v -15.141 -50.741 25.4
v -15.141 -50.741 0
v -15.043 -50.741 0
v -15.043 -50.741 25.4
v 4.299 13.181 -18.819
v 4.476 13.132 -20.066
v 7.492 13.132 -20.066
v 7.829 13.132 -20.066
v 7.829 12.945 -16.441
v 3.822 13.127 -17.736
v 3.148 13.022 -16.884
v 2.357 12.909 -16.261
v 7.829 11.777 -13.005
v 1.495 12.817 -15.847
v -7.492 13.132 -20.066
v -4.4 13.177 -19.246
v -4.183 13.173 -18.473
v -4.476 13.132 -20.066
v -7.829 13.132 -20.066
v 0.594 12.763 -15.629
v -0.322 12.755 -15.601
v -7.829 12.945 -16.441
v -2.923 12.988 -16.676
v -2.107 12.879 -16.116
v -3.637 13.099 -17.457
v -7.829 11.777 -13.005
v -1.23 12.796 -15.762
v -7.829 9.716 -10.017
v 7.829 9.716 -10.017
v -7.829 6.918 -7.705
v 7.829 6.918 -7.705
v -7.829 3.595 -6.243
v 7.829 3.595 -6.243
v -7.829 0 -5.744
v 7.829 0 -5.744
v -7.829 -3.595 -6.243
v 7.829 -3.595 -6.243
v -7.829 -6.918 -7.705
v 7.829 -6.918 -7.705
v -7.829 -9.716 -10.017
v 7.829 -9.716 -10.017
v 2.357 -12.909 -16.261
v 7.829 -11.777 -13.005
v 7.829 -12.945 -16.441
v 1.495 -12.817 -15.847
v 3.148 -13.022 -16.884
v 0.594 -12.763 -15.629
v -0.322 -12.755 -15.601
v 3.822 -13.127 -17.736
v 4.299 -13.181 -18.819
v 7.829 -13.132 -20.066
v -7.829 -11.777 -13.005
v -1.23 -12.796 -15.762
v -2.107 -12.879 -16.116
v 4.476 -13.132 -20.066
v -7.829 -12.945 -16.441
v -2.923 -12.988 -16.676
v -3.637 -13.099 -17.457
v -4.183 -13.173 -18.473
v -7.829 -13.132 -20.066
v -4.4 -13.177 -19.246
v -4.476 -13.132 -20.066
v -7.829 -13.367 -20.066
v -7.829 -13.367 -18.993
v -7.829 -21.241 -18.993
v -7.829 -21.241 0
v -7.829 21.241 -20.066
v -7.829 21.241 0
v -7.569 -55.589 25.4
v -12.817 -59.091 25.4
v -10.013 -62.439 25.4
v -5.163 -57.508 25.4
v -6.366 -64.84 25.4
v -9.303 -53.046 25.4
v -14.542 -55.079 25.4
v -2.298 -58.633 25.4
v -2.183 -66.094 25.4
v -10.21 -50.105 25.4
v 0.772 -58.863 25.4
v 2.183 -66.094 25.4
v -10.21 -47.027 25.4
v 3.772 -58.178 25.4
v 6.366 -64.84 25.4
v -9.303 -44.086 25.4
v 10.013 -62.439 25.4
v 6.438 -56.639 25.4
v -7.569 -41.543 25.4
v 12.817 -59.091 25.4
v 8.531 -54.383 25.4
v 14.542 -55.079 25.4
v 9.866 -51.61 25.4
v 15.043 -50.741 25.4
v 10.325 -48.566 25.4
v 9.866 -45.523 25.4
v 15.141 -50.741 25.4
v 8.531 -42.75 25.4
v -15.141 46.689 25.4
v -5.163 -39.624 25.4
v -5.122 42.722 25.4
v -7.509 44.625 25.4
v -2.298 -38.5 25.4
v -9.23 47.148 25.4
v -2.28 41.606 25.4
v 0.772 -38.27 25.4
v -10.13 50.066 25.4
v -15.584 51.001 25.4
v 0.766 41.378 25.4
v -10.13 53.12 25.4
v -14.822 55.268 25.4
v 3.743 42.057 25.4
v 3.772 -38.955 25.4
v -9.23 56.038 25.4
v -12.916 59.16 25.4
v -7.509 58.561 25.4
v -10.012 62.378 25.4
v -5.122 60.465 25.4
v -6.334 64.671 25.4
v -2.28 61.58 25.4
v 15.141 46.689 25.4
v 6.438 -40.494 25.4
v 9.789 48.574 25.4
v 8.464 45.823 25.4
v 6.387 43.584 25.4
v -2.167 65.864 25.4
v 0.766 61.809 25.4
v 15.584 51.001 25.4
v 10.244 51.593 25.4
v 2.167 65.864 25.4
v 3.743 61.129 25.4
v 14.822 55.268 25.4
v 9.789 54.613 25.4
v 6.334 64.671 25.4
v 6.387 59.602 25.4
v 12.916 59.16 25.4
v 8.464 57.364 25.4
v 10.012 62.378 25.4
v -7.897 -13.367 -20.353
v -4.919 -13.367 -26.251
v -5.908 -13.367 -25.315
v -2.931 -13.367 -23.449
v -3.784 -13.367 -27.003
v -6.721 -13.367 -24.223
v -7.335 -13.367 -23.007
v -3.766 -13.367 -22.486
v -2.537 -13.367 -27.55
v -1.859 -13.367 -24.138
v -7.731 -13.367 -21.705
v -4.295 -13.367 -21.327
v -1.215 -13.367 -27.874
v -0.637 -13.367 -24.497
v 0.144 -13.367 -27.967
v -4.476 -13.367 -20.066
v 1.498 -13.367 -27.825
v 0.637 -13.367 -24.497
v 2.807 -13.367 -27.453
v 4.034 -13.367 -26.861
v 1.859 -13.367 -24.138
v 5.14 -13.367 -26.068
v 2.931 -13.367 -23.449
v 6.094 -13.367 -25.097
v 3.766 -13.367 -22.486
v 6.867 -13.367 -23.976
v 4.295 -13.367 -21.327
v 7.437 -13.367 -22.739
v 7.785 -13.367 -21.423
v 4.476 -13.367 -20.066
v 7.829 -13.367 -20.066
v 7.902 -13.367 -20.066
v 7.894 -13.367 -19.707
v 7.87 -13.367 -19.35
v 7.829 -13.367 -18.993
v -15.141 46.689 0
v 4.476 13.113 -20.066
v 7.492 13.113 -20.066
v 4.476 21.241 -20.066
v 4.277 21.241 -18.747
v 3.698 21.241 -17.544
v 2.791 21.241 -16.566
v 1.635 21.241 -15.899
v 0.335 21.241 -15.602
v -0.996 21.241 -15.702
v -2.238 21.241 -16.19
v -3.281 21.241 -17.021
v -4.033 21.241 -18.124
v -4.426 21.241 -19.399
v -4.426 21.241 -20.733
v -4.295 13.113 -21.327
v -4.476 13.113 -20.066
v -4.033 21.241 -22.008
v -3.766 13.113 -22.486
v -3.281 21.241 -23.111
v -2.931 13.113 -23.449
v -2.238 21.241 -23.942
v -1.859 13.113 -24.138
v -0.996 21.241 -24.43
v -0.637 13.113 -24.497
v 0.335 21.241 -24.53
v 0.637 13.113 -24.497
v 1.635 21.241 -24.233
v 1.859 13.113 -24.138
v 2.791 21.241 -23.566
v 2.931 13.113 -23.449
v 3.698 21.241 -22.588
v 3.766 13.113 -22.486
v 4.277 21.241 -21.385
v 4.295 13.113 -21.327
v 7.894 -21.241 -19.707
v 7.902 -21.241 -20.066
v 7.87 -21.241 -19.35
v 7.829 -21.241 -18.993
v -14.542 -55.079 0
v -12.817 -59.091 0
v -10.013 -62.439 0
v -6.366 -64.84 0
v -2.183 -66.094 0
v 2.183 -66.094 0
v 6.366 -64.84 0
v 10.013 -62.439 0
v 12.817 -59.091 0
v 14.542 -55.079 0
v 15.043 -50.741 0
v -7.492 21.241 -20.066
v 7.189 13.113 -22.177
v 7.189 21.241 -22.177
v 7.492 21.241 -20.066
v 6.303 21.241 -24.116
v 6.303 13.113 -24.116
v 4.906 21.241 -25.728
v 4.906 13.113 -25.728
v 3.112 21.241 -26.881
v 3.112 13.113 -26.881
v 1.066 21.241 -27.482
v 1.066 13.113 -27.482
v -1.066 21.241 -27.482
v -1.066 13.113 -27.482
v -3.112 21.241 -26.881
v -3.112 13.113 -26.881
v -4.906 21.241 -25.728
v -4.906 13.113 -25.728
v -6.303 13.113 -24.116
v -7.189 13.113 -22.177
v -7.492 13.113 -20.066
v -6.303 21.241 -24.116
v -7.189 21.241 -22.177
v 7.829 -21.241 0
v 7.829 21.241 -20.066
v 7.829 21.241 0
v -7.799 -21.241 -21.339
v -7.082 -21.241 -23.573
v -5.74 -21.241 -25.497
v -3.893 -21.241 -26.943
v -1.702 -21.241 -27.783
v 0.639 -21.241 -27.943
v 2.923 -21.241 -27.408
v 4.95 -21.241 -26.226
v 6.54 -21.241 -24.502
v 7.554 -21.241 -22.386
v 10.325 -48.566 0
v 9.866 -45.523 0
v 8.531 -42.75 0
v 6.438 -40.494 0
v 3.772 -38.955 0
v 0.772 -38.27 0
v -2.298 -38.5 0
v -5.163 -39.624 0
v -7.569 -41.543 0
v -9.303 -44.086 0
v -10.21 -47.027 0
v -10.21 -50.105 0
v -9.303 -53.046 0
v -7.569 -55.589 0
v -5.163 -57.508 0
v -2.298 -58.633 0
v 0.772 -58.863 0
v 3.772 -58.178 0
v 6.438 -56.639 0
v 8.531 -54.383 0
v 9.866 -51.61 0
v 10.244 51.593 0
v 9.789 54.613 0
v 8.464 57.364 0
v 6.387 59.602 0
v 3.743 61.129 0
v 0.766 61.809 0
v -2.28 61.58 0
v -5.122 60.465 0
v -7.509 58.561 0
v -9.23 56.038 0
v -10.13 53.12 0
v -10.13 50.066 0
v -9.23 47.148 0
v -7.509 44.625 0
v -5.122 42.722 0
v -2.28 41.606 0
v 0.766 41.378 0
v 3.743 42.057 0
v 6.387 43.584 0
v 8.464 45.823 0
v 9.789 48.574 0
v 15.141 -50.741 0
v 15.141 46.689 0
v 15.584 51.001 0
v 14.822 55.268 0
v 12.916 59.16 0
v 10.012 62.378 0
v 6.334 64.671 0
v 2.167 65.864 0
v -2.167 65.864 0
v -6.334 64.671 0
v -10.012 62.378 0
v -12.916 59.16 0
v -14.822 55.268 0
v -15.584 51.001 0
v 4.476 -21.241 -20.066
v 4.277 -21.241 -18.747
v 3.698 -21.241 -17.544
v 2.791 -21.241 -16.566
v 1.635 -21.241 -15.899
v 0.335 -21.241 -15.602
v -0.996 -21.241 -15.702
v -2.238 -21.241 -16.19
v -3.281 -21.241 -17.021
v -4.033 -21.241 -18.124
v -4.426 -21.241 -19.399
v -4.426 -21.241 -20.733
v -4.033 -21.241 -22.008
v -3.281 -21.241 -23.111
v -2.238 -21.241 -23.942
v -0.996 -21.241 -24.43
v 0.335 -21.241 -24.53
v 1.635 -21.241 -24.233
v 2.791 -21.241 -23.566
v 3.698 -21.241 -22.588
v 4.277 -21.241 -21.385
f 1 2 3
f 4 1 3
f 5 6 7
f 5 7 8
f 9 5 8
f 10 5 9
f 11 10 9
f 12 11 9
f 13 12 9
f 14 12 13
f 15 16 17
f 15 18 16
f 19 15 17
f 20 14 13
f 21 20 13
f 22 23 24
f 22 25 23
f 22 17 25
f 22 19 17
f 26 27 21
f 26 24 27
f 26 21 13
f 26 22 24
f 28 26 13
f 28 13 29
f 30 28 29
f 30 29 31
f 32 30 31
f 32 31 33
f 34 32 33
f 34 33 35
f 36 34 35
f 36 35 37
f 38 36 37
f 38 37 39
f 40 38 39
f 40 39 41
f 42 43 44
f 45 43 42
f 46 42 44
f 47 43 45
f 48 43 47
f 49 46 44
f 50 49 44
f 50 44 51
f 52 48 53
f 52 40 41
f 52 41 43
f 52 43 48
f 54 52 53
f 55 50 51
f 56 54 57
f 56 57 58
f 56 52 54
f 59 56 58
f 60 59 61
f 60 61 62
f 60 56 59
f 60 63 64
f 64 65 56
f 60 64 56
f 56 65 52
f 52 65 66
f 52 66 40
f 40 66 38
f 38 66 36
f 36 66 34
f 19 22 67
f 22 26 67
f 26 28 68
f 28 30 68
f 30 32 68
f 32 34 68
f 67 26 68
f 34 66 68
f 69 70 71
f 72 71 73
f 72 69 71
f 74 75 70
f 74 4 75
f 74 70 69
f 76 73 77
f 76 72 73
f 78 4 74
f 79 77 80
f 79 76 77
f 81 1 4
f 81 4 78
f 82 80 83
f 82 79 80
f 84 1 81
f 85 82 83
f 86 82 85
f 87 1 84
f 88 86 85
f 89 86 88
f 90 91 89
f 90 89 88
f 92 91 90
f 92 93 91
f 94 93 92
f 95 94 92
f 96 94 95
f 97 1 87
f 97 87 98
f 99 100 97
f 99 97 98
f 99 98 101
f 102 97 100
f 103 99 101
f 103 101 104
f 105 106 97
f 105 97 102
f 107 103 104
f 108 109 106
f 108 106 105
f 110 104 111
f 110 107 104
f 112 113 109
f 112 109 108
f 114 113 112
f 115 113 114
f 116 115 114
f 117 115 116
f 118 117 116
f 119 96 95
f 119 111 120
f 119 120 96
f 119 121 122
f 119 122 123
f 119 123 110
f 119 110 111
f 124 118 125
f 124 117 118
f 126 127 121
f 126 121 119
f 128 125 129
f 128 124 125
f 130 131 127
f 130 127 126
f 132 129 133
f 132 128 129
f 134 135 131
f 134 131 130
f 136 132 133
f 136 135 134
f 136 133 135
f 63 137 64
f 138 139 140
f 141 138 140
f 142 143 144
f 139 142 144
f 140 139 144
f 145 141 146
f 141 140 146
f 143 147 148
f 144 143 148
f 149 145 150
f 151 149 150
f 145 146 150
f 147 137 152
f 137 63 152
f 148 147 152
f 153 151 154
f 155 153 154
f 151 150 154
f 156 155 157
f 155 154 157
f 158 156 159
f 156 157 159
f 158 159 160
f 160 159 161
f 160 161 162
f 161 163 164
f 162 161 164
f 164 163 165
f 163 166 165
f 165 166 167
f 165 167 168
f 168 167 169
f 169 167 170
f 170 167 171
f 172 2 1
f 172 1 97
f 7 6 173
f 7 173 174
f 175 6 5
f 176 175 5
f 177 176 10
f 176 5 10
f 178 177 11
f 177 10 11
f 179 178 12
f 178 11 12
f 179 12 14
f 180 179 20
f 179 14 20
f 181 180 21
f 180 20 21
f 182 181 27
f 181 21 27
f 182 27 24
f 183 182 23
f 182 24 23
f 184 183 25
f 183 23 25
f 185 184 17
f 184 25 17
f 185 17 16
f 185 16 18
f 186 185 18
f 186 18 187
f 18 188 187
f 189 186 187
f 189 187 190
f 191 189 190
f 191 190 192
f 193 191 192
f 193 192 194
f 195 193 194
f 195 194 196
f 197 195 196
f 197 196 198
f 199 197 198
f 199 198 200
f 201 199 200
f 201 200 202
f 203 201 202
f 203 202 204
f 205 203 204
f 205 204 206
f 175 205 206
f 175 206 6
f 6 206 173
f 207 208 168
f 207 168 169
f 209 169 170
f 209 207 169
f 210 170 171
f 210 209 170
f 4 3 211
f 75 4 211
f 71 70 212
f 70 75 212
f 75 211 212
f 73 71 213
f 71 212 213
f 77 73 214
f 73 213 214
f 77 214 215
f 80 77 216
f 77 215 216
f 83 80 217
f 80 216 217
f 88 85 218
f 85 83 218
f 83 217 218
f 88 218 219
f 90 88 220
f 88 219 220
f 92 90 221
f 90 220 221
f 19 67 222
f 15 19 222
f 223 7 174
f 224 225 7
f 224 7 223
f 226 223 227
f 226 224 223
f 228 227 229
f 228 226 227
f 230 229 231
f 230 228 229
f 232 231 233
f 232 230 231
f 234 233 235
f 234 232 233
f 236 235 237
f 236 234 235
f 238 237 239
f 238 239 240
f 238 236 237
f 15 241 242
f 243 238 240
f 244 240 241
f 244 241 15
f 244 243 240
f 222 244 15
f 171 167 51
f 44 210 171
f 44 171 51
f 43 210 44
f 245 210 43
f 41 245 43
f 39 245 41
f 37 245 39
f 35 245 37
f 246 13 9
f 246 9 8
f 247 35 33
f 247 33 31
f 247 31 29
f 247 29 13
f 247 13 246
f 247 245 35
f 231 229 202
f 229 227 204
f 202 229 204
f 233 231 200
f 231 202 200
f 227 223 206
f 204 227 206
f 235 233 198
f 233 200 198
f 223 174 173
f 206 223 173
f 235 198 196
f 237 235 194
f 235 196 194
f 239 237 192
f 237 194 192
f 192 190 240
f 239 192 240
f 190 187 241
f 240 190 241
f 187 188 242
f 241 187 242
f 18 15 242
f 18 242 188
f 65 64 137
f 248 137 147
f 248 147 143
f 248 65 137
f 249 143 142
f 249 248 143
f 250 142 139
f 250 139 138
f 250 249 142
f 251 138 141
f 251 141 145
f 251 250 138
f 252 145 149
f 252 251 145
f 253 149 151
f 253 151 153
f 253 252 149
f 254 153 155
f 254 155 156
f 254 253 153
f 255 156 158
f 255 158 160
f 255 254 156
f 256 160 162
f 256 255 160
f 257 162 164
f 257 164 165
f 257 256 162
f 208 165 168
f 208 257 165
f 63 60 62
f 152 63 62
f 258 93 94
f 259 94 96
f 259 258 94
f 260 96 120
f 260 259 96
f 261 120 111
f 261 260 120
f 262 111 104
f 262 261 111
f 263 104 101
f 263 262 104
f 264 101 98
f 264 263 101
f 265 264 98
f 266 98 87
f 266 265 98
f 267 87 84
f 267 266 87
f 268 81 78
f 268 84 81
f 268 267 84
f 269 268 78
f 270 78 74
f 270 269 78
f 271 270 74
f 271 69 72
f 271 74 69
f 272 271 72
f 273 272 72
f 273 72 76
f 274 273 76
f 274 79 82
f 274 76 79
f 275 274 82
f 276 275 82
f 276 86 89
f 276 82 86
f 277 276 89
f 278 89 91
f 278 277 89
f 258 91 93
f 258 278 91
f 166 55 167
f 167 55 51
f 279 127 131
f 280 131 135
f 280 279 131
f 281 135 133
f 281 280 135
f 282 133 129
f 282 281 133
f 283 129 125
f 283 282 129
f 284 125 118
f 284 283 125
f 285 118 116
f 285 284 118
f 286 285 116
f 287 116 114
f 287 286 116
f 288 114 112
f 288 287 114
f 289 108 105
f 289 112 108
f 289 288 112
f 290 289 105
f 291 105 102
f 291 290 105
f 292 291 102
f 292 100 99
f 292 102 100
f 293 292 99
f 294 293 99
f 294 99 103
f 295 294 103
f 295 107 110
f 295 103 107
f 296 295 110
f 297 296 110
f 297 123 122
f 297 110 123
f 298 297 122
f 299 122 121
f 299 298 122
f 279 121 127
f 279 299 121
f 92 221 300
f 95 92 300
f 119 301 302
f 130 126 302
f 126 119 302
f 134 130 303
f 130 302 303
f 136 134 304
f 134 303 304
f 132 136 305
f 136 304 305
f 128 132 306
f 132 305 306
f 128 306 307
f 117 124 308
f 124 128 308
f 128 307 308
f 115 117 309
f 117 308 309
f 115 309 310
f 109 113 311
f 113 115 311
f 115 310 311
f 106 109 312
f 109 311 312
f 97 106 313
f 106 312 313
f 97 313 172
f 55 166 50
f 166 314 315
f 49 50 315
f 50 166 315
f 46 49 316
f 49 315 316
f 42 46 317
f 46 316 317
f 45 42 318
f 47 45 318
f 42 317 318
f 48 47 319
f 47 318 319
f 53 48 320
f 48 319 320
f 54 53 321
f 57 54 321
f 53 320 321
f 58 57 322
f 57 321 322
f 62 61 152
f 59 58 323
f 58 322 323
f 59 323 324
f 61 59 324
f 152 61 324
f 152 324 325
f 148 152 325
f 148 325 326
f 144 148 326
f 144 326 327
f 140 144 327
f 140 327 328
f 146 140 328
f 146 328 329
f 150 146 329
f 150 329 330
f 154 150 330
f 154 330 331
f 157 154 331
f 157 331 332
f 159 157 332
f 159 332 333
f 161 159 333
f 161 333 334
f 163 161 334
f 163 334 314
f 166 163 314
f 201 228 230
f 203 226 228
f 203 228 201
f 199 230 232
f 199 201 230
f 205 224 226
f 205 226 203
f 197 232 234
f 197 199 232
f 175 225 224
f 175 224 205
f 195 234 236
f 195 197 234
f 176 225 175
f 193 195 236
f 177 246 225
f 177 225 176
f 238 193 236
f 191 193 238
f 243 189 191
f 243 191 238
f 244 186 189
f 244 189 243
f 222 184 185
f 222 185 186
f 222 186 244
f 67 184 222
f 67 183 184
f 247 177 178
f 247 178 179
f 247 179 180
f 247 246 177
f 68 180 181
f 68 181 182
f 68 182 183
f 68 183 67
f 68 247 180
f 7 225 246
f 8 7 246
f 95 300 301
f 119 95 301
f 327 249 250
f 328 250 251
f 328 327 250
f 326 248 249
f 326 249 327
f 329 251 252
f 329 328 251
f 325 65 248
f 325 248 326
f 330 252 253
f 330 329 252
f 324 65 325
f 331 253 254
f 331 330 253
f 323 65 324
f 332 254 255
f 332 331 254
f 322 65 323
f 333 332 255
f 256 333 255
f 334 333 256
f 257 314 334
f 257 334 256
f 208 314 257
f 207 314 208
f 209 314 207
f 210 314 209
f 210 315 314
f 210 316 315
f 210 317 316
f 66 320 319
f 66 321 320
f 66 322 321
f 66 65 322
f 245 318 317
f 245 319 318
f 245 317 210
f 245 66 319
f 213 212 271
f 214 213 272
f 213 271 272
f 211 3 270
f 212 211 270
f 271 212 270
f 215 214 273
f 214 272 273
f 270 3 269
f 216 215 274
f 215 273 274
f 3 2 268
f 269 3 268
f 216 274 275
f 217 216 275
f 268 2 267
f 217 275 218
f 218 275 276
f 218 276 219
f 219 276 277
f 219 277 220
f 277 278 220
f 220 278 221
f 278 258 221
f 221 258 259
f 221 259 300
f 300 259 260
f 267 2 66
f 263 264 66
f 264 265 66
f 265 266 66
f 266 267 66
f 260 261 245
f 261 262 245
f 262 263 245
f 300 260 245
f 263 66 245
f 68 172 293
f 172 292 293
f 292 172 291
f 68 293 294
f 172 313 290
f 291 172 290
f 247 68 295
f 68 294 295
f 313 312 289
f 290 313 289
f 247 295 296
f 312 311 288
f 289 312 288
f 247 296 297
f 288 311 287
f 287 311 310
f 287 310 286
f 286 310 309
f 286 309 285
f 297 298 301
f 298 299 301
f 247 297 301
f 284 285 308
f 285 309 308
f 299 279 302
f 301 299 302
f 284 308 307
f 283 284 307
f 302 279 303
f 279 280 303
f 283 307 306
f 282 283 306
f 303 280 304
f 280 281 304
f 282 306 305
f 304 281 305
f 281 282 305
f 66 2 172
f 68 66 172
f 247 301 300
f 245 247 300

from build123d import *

# Parameters (mm, degrees)
F0_W      = 30.2820764482
F0_H      = 101.4822497964
F3_DEPTH  = 25.4
F2_R      = 15.0499216081
F4_DEPTH  = 25.4
F1_R      = 15.5943038306
F5_DEPTH  = 25.4
F6_R      = 10.2440117392
F7_DEPTH  = 49.022
F8_R      = 10.3251238381
F9_DEPTH  = 31.75
F10_W     = 15.6584940851
F10_H     = 42.4823574722
F11_DEPTH = 20.066
F12_R     = 13.1812227962
F13_DEPTH = 25.4
F14_DEPTH = 25.4
F16_DEPTH = 8.128
F18_DEPTH = 7.874
F19_R     = 4.4761775303
F20_DEPTH = 55.118


with BuildPart() as f3:
    # F0 (on Top) → F3 (new body)
    with BuildSketch(Plane.XY):
        Rectangle(F0_W, F0_H)
    extrude(amount=F3_DEPTH)

    # F2 (on Top) → F4 (join)
    with BuildSketch(Plane.XY):
        with Locations((0, -51.2032657862)):
            Circle(F2_R)
    extrude(amount=F4_DEPTH)

    # F1 (on Top) → F5 (join)
    with BuildSketch(Plane.XY):
        with Locations((0, 50.4214018583)):
            Circle(F1_R)
    extrude(amount=F5_DEPTH)

    # F6 (on Top) → F7 (cut)
    with BuildSketch(Plane.XY):
        with Locations((0, 51.5931844711)):
            Circle(F6_R)
    extrude(amount=F7_DEPTH, mode=Mode.SUBTRACT)

    # F8 (on Top) → F9 (cut)
    with BuildSketch(Plane.XY):
        with Locations((0, -48.5663115978)):
            Circle(F8_R)
    extrude(amount=F9_DEPTH, mode=Mode.SUBTRACT)

    # F10 (on Top) → F11 (join)
    with BuildSketch(Plane.XY):
        Rectangle(F10_W, F10_H)
    extrude(amount=-F11_DEPTH)

    # F12 (on Right) → F13 (cut)
    with BuildSketch(Plane.YZ):
        with Locations((0, -18.9247615635)):
            Circle(F12_R)
    extrude(amount=-F13_DEPTH, mode=Mode.SUBTRACT)

    # F14 (cut): a face of the model
    f14_faces = [f3.faces().sort_by_distance(p)[0] for p in [
        (0, 0, -13.9418780745),
    ]]
    extrude(f14_faces, amount=-F14_DEPTH, mode=Mode.SUBTRACT)

    # F15 (on face) → F16 (join)
    with BuildSketch(Plane(origin=(0, 21.2411787361, 0), x_dir=(-1, 0, 0), z_dir=(0, 1, 0))):
        with BuildLine():
            ThreePointArc((-7.4920039842, -20.066), (0, -27.5580039842), (7.4920039842, -20.066))
            Line((7.4920039842, -20.066), (-7.4920039842, -20.066))
        make_face()
    extrude(amount=-F16_DEPTH)

    # F17 (on face) → F18 (join)
    with BuildSketch(Plane.XZ.offset(21.2411787361)):
        with BuildLine():
            ThreePointArc((-7.8292470425, -18.9932599539), (-0.5376156021, -27.9500884016), (7.9023971338, -20.066))
            ThreePointArc((7.9023971338, -20.066), (7.8840884016, -19.5283843979), (7.8292470425, -18.9932599539))
            Line((7.8292470425, -18.9932599539), (7.8292470425, -20.066))
            Line((7.8292470425, -20.066), (-7.8292470425, -20.066))
            Line((-7.8292470425, -20.066), (-7.8292470425, -18.9932599539))
        make_face()
    extrude(amount=-F18_DEPTH)

    # F19 (on face) → F20 (cut)
    with BuildSketch(Plane.XZ.offset(21.2411787361)):
        with Locations((0, -20.066)):
            Circle(F19_R)
    extrude(amount=-F20_DEPTH, mode=Mode.SUBTRACT)


solid = f3.part
